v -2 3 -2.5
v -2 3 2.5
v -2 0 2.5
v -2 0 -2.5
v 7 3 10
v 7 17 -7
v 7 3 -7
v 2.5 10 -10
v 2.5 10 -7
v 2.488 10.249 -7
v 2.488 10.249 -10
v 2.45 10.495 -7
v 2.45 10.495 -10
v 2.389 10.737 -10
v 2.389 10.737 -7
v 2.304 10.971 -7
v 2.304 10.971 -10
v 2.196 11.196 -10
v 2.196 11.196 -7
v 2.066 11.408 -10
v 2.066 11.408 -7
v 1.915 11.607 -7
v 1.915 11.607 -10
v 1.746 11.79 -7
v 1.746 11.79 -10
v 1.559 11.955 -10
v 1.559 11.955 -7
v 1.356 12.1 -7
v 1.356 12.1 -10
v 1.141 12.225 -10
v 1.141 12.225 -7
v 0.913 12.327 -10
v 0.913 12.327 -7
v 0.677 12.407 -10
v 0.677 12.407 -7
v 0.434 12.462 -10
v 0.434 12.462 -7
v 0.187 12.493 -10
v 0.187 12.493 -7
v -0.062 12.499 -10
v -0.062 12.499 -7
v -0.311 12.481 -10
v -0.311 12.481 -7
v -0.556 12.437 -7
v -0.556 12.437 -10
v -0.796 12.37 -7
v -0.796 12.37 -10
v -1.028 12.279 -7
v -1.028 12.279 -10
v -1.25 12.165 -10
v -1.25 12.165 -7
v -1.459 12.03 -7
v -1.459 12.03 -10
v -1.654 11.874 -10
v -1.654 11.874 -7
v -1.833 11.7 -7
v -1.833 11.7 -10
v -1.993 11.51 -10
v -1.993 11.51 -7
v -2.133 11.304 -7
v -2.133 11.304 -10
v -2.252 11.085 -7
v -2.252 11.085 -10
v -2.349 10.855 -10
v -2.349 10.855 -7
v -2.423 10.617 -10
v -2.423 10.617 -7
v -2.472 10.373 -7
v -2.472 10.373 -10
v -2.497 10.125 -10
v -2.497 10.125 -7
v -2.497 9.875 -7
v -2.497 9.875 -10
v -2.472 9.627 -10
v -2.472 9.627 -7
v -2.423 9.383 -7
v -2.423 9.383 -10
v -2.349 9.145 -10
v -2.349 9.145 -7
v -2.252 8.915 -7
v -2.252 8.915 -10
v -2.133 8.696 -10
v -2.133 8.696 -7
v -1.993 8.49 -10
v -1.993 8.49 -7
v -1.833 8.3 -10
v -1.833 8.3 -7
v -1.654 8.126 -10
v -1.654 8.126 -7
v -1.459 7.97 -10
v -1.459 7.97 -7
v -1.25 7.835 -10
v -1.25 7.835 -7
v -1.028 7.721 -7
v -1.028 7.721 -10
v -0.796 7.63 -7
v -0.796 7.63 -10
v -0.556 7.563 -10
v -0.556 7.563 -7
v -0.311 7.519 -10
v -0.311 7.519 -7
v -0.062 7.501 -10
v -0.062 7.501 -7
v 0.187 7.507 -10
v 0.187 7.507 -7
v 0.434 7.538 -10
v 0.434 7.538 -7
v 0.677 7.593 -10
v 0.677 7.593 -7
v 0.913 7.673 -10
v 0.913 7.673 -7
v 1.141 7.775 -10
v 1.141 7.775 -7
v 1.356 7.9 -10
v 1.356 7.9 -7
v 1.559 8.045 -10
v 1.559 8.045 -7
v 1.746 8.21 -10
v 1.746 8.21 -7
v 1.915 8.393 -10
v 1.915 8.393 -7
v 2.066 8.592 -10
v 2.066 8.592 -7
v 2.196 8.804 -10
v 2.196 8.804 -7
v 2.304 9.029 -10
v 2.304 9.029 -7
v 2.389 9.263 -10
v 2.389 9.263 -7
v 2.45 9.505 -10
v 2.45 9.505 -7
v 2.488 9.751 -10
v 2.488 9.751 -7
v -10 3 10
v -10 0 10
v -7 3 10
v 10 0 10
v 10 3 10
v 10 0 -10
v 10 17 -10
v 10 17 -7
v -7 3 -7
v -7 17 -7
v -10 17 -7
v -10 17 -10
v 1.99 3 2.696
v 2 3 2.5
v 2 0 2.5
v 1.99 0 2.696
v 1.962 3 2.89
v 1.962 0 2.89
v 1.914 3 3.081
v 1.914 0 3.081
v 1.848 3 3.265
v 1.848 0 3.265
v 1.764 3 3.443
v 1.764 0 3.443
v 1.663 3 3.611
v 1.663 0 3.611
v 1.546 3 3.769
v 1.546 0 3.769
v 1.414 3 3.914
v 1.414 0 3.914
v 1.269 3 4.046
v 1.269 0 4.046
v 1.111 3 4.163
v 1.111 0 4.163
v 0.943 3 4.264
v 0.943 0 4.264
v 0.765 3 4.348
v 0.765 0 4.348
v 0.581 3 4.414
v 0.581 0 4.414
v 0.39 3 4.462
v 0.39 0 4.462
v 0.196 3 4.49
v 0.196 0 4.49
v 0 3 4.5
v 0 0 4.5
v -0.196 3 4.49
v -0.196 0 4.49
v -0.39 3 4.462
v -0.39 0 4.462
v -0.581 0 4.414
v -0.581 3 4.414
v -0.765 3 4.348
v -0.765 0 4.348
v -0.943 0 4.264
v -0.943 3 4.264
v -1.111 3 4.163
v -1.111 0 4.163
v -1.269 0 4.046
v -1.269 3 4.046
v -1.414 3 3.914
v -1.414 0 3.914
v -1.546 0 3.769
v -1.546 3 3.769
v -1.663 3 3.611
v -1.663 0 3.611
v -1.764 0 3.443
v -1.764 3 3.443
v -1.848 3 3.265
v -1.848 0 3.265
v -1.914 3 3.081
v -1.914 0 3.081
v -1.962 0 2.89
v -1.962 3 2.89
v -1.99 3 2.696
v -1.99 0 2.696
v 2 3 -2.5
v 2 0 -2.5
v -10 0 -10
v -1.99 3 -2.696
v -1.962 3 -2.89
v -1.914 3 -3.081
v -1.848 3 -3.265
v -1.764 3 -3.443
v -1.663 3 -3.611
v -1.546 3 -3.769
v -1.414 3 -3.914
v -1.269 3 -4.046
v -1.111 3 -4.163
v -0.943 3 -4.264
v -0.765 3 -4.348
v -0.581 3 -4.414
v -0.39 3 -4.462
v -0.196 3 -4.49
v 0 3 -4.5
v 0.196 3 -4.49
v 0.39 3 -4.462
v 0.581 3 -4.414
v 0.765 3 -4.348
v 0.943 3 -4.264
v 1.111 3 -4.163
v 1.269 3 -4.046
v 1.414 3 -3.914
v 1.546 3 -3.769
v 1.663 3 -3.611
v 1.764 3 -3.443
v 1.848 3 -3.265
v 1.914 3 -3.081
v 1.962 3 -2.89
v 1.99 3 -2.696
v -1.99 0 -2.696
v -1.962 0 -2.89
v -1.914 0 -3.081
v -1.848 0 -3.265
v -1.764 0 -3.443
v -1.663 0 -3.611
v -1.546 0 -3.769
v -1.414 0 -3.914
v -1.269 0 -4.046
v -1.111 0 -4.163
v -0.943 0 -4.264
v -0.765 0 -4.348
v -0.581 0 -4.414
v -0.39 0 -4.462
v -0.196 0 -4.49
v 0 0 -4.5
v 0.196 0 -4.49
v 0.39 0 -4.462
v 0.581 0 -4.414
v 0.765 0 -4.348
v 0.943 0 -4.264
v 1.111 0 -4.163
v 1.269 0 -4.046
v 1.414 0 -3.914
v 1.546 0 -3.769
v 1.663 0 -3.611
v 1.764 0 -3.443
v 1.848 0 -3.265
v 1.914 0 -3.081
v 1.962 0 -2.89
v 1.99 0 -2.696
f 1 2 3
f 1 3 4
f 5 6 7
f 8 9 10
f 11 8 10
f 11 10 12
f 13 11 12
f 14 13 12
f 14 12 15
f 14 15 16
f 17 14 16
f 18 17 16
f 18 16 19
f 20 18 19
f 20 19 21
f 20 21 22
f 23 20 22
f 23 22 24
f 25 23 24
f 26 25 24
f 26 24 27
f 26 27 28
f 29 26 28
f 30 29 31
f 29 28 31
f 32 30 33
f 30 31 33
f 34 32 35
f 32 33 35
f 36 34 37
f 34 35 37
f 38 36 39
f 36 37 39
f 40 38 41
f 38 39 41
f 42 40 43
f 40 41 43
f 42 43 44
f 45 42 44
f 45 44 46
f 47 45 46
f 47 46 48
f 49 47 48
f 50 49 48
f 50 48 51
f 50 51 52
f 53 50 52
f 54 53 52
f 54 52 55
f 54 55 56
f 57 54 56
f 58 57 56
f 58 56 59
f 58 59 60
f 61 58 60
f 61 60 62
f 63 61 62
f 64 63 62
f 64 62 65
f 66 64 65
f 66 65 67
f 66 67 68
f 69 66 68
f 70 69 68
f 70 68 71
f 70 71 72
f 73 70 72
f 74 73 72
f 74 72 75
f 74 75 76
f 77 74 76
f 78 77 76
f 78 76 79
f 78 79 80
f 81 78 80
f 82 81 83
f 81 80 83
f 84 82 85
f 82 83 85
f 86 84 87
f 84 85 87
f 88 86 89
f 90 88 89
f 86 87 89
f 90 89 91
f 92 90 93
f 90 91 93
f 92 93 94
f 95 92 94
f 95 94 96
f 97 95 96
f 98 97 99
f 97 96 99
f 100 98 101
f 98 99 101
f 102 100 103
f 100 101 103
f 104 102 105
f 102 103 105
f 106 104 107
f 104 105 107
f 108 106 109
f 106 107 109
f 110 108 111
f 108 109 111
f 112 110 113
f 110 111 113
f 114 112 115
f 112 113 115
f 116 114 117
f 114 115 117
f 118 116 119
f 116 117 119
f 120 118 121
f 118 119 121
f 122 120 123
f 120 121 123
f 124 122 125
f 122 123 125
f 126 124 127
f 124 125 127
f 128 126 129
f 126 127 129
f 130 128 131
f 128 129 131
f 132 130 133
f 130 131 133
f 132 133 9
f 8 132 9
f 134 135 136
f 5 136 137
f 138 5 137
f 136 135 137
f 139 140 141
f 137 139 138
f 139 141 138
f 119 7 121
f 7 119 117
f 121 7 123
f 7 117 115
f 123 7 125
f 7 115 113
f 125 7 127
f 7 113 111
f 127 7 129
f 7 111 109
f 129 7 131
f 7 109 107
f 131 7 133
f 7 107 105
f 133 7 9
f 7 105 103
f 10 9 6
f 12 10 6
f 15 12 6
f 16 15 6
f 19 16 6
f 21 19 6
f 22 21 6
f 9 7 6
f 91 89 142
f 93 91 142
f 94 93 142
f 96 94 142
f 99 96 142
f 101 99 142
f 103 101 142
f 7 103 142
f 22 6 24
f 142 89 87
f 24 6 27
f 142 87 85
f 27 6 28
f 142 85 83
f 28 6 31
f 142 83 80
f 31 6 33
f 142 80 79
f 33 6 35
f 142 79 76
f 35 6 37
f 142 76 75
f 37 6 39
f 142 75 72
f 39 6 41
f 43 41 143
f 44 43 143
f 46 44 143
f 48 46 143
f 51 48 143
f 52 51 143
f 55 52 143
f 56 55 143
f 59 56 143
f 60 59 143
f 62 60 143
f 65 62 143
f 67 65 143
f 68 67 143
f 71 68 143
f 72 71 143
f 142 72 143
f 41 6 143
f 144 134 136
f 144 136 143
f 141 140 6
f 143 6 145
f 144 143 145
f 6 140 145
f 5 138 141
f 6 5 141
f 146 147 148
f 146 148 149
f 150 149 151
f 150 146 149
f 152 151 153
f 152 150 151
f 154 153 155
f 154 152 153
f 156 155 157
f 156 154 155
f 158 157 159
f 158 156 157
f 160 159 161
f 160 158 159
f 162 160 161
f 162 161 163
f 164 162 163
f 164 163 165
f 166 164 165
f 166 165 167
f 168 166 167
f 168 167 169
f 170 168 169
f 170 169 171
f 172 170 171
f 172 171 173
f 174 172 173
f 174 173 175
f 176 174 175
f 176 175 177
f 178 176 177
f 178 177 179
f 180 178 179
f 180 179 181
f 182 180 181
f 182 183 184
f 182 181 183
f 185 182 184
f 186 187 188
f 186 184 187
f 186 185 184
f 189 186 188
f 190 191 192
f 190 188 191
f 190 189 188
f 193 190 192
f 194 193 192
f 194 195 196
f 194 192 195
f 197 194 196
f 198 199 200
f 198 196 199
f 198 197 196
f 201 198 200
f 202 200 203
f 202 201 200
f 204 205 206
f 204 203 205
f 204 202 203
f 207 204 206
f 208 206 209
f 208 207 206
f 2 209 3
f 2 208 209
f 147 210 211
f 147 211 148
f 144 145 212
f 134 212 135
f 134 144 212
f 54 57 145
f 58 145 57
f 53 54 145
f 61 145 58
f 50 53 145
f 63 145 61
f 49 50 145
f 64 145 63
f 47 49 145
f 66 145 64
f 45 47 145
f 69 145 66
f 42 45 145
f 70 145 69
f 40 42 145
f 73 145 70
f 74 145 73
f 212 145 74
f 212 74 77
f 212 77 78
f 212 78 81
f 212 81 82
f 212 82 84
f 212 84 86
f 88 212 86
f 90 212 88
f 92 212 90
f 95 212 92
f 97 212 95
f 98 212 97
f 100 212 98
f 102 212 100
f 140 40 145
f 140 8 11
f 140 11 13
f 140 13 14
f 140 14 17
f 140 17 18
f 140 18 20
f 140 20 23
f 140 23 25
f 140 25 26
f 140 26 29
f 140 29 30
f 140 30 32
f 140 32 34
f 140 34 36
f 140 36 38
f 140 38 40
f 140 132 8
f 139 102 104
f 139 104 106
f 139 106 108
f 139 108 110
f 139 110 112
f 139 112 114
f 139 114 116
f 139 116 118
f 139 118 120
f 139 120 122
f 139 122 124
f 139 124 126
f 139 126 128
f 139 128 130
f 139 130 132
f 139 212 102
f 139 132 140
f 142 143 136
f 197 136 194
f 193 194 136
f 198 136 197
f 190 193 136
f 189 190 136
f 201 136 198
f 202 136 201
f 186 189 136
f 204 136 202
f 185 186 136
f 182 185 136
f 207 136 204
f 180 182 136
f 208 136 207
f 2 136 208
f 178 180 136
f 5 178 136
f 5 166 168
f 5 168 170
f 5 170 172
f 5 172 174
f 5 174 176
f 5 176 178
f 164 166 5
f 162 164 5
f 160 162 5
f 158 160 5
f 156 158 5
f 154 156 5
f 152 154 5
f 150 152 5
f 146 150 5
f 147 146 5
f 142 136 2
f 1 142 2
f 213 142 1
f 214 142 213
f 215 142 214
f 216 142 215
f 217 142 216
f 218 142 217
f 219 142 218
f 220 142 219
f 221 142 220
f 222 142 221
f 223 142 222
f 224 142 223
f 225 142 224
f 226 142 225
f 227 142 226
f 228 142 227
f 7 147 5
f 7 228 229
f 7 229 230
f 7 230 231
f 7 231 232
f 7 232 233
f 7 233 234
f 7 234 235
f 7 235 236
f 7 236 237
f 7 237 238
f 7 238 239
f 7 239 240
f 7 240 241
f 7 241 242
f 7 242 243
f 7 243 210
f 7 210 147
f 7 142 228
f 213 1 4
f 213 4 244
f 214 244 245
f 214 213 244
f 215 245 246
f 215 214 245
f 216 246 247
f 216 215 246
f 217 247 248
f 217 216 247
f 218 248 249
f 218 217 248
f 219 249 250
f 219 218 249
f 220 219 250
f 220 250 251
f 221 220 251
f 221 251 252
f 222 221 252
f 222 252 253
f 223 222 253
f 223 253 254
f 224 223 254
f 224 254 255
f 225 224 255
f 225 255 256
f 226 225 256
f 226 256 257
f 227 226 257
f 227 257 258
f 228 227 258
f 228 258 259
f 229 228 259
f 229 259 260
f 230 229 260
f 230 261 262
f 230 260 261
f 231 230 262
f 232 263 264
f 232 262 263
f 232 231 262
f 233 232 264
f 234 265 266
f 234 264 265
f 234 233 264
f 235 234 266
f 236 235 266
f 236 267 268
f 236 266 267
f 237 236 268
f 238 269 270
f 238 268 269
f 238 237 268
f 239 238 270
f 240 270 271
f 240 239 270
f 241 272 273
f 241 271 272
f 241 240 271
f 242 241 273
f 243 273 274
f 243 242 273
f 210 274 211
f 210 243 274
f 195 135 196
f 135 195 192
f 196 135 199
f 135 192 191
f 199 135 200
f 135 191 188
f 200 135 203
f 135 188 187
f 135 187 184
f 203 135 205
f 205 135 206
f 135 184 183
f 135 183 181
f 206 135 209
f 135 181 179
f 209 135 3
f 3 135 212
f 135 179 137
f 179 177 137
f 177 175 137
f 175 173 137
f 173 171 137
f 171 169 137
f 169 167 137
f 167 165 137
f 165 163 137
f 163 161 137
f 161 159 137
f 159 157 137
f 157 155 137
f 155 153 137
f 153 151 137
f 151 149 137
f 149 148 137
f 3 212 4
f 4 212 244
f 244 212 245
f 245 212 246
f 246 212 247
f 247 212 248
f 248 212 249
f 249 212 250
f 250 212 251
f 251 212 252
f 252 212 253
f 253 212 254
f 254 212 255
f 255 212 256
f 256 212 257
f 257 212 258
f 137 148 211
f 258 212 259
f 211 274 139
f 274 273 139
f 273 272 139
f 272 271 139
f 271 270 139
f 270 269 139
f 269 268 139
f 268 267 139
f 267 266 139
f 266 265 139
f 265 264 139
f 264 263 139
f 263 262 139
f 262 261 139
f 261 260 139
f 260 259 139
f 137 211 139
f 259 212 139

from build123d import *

# Parameters (mm, degrees)
SKETCH1_W           = 20
SKETCH1_H           = 20
BOSS_EXTRUDE1_DEPTH = 3
SKETCH2_W           = 20
SKETCH2_H           = 17
BOSS_EXTRUDE2_DEPTH = 3
BOSS_EXTRUDE3_DEPTH = 3
SKETCH4_R           = 2.5
CUT_EXTRUDE1_DEPTH  = 27.038433133
CUT_EXTRUDE2_DEPTH  = 4


with BuildPart() as part:
    # Sketch1 → Boss-Extrude1 (new body)
    with BuildSketch(Plane(origin=(0, 0, 0), x_dir=(1, 0, 0), z_dir=(0, 1, 0))):
        Rectangle(SKETCH1_W, SKETCH1_H)
    extrude(amount=BOSS_EXTRUDE1_DEPTH)

    # Sketch2 → Boss-Extrude2 (add)
    with BuildSketch(Plane(origin=(0, 0, -10), x_dir=(-1, 0, 0), z_dir=(0, 0, -1))):
        with Locations((0, 8.5)):
            Rectangle(SKETCH2_W, SKETCH2_H)
    extrude(amount=-BOSS_EXTRUDE2_DEPTH)

    # Sketch3 → Boss-Extrude3 (add)
    with BuildSketch(Plane(origin=(10, 0, 0), x_dir=(0, 0, -1), z_dir=(1, 0, 0))):
        Polygon((7, 17), (7, 3), (-10, 3), align=None)
    boss_extrude3 = extrude(amount=-BOSS_EXTRUDE3_DEPTH)

    # Mirror1: Boss-Extrude3 across plane
    add(boss_extrude3.mirror(Plane(origin=(0, 0, 0), x_dir=(0, 0, 1), z_dir=(1, 0, 0))))

    # Sketch4 → Cut-Extrude1 (cut, through all)
    with BuildSketch(Plane.XY.offset(-7)):
        with Locations((0, 10)):
            Circle(SKETCH4_R)
    extrude(amount=-CUT_EXTRUDE1_DEPTH, mode=Mode.SUBTRACT)

    # Sketch5 → Cut-Extrude2 (cut)
    with BuildSketch(Plane(origin=(0, 3, 0), x_dir=(1, 0, 0), z_dir=(0, 1, 0))):
        with BuildLine():
            Line((-2, -2.5), (-2, 2.5))
            ThreePointArc((-2, 2.5), (0, 4.5), (2, 2.5))
            Line((2, 2.5), (2, -2.5))
            ThreePointArc((2, -2.5), (0, -4.5), (-2, -2.5))
        make_face()
    extrude(amount=-CUT_EXTRUDE2_DEPTH, mode=Mode.SUBTRACT)


solid = part.part
